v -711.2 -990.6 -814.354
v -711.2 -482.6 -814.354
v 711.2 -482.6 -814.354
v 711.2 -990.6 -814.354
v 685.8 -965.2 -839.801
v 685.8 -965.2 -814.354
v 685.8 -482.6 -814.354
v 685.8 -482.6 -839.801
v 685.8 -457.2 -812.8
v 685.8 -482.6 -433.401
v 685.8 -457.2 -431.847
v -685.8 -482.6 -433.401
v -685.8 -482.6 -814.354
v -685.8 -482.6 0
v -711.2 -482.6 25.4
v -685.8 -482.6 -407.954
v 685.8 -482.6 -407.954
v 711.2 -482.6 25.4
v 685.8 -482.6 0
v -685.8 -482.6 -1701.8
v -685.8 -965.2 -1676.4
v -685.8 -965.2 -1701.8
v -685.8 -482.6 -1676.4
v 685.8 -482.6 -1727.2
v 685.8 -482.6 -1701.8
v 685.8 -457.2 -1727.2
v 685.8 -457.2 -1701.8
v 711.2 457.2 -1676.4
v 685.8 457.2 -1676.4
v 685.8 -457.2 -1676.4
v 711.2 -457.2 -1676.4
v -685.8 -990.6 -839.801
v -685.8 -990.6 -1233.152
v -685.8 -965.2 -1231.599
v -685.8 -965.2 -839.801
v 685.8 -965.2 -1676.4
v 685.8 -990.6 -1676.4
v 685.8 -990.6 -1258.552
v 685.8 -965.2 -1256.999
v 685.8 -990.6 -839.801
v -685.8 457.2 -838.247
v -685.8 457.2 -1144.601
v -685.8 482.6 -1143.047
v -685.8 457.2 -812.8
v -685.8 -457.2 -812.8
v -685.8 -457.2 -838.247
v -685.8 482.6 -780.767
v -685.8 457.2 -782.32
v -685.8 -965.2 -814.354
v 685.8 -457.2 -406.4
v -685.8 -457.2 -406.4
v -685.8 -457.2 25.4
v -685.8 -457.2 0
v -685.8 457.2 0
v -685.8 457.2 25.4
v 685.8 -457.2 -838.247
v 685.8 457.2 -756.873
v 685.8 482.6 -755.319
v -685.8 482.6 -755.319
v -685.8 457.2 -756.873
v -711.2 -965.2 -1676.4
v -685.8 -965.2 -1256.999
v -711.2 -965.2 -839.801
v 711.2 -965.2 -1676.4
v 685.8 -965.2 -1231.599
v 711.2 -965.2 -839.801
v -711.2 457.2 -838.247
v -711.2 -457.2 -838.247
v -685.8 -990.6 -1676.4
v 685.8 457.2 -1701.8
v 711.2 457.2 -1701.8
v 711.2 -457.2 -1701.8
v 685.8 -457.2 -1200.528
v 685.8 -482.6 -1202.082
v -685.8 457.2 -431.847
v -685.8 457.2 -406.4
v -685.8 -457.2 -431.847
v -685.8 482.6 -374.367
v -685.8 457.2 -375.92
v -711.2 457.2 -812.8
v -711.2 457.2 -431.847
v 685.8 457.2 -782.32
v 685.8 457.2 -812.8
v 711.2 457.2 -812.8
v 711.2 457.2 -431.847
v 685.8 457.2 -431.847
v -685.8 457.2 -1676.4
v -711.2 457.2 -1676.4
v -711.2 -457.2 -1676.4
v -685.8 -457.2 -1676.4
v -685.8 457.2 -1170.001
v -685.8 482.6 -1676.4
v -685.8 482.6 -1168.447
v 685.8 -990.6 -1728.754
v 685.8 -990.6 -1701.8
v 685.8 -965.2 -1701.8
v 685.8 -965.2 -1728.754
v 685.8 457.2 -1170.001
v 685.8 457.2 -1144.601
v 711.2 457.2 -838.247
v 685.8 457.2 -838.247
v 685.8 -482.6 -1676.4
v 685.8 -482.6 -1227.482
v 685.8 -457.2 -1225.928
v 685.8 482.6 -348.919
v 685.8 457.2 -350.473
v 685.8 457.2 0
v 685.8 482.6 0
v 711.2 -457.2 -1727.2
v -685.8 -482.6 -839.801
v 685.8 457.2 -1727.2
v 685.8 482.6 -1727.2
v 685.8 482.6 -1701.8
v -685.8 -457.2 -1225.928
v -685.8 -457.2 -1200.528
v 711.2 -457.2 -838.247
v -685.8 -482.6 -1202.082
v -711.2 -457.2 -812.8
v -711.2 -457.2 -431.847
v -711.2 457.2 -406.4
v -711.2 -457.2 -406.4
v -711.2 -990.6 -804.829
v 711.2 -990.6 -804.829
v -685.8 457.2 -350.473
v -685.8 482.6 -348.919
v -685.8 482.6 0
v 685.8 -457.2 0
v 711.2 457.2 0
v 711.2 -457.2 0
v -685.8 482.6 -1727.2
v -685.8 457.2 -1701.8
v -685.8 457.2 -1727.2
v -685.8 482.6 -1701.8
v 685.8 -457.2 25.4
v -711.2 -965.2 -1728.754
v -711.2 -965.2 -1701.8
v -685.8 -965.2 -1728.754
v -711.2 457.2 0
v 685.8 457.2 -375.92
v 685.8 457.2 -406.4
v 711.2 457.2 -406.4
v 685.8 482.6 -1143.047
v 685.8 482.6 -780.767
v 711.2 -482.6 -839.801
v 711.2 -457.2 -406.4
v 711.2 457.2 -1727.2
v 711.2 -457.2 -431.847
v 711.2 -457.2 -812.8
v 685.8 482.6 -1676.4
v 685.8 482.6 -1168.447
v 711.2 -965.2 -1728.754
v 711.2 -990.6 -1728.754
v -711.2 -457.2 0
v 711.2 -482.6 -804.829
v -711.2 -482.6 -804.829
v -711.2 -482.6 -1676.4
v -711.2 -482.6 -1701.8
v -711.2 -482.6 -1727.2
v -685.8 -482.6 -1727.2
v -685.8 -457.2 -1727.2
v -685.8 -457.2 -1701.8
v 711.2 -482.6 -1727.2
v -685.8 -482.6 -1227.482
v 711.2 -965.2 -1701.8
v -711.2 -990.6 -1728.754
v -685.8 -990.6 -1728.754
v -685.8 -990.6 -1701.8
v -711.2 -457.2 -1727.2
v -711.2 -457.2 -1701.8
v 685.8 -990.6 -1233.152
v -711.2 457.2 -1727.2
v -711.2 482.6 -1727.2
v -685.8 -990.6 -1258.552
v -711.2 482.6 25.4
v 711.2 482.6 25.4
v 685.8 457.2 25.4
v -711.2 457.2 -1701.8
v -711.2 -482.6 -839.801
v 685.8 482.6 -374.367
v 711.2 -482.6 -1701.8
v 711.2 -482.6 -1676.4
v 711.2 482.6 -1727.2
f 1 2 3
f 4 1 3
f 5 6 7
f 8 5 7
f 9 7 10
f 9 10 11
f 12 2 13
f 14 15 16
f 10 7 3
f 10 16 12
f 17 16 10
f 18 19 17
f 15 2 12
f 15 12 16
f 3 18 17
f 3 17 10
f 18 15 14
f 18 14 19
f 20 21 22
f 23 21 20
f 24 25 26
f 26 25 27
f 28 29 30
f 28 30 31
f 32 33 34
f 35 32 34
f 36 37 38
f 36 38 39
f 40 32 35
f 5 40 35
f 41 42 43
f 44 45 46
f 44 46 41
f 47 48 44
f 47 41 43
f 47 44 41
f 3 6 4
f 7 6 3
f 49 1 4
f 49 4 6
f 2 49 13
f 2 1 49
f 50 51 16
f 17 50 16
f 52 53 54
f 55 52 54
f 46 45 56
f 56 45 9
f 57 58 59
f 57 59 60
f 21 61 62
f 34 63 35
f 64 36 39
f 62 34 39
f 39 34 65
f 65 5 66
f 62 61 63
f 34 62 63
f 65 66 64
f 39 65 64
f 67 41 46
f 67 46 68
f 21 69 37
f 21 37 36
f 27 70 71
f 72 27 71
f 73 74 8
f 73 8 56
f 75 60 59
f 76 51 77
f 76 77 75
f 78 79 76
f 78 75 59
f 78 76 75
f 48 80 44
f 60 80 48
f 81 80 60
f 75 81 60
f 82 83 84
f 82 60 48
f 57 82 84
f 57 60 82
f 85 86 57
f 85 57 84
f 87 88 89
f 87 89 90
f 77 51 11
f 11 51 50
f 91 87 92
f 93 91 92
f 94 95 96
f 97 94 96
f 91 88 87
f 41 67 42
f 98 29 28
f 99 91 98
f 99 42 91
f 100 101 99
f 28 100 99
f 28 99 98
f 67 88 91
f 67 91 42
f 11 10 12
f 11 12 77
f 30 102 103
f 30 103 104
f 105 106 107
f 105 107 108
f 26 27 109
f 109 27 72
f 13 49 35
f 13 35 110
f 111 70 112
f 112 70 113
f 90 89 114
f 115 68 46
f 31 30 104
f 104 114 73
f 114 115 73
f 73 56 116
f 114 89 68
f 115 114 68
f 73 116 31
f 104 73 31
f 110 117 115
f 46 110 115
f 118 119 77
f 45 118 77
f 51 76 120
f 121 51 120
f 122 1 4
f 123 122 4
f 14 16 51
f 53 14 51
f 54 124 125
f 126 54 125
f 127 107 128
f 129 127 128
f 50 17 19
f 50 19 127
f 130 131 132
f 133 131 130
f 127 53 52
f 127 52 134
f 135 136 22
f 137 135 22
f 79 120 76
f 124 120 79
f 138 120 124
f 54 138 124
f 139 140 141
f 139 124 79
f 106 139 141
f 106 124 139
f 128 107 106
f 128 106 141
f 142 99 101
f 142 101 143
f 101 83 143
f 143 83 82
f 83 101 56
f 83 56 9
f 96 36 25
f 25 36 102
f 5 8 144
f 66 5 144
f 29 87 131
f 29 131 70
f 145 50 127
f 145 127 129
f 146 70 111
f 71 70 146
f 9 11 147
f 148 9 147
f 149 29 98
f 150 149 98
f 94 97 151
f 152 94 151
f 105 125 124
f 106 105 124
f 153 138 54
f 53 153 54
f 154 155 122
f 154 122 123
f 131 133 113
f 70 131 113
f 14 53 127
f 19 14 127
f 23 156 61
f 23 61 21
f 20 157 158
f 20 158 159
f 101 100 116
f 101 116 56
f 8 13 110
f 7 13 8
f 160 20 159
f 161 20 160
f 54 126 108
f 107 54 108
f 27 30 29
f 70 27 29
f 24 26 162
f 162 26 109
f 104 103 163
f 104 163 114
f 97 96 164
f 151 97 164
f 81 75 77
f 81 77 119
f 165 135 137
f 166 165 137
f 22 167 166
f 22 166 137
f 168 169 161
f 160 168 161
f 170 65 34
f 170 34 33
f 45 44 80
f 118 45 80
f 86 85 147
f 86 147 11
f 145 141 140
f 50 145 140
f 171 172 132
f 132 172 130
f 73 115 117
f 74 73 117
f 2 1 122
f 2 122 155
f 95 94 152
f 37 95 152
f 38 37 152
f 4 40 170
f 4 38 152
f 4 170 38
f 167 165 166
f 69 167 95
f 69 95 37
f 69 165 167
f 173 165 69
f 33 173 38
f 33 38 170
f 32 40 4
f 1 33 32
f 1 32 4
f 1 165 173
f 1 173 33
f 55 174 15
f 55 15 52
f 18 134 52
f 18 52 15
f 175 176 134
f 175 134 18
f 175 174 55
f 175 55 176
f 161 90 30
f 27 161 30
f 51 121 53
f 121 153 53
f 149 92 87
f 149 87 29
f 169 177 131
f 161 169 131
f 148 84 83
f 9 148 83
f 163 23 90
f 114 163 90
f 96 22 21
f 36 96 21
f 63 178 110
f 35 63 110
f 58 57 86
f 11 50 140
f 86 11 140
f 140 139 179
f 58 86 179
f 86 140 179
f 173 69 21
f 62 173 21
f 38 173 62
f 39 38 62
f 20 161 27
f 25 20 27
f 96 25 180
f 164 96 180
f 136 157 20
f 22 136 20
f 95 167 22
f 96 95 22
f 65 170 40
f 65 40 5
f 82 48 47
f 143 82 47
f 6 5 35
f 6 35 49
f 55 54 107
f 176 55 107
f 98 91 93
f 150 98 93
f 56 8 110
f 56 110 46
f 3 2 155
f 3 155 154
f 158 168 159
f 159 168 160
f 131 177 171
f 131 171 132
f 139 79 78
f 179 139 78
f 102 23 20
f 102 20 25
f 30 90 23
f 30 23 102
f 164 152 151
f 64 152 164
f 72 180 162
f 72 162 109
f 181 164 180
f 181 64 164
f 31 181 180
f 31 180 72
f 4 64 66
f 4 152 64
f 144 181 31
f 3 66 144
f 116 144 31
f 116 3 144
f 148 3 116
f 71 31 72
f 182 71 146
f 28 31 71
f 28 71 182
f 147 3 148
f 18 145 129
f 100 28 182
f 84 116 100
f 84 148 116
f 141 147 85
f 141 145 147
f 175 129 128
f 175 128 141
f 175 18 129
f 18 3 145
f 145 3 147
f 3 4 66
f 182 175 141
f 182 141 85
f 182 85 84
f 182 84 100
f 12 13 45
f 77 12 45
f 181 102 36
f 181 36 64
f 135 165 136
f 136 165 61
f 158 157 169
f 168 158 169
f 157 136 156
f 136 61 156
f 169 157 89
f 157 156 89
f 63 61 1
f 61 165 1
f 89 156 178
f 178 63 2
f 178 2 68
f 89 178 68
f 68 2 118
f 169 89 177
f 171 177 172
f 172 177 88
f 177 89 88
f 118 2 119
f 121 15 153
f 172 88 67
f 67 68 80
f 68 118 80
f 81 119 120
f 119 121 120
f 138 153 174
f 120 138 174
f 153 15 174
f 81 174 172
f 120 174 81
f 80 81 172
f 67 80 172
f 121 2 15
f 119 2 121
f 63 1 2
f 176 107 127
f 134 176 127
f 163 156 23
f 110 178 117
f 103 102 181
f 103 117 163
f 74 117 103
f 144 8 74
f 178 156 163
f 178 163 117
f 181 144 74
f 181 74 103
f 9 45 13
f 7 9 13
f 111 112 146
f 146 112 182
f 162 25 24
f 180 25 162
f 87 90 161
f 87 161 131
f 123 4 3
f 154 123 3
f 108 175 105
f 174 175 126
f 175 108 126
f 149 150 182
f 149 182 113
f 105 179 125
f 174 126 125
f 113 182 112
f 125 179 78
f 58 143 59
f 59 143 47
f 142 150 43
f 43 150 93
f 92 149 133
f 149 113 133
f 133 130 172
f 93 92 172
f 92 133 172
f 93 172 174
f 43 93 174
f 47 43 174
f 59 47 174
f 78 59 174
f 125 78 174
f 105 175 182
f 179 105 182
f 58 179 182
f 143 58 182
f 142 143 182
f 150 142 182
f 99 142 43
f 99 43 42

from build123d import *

# Parameters (mm, degrees)
F0_W      = 25.4
F0_H      = 914.4
F0_H_2    = 25.4
F0_W_2    = 1371.6
F1_DEPTH  = 25.4
F2_DEPTH  = 1727.2
F4_DEPTH  = 1422.4
F6_W      = 1422.4
F6_H      = 965.2
F6_W_2    = 1371.6
F6_H_2    = 914.4
F7_DEPTH  = 25.4
F8_W      = 25.4
F8_H      = 25.4474646512
F9_DEPTH  = 914.4
F10_W     = 25.4
F10_H     = 25.4474646512
F10_H_2   = 25.4
F11_DEPTH = 508
F12_W     = 25.4
F12_H     = 25.4
F13_DEPTH = 914.4
F14_W     = 25.4
F14_H     = 25.4
F15_DEPTH = 914.4
F16_W     = 25.4
F16_H     = 25.4474646512
F16_H_2   = 25.4
F17_DEPTH = 1371.6
F18_W     = 1422.4
F18_H     = 508
F19_DEPTH = 9.525
F21_DEPTH = 1422.4


# Not quite as in the source:
# - a feature names something its author has since deleted; it is built from what else it names


with BuildPart() as f1:
    # F0 (on Top) → F1 (new body)
    with BuildSketch(Plane.XY):
        with Locations((698.5, 0)):
            Rectangle(F0_W, F0_H)
        with Locations((698.5, 469.9)):
            Rectangle(F0_W, F0_H_2)
        with Locations((0, 469.9)):
            Rectangle(F0_W_2, F0_H_2)
        with Locations((-698.5, 0)):
            Rectangle(F0_W, F0_H)
        with Locations((-698.5, 469.9)):
            Rectangle(F0_W, F0_H_2)
        with Locations((0, -469.9)):
            Rectangle(F0_W_2, F0_H_2)
        with Locations((698.5, -469.9)):
            Rectangle(F0_W, F0_H_2)
        with Locations((-698.5, -469.9)):
            Rectangle(F0_W, F0_H_2)
    extrude(amount=F1_DEPTH)

    # F0 (on Top) → F2 (join)
    with BuildSketch(Plane.XY):
        with Locations((-698.5, -469.9)):
            Rectangle(F0_W, F0_H_2)
        with Locations((-698.5, 469.9)):
            Rectangle(F0_W, F0_H_2)
        with Locations((698.5, 469.9)):
            Rectangle(F0_W, F0_H_2)
        with Locations((698.5, -469.9)):
            Rectangle(F0_W, F0_H_2)
    extrude(amount=-F2_DEPTH)

    # F3 (on face) → F4 (join)
    with BuildSketch(Plane.YZ.offset(711.2)):
        Polygon((-457.2, -431.8474646512), (-457.2, -406.4), (-482.6, -407.9535305518), (-482.6, -433.400995203), align=None)
        Polygon((482.6, -348.9193695826), (457.2, -350.4729001344), (457.2, -375.9203647856), (482.6, -374.3668342338), align=None)
        Polygon((482.6, -755.3193695826), (457.2, -756.8729001344), (457.2, -782.3203647856), (482.6, -780.7668342338), align=None)
        Polygon((-457.2, -838.2474646512), (-457.2, -812.8), (-482.6, -814.3535305518), (-482.6, -839.800995203), align=None)
    extrude(amount=-F4_DEPTH)

    # F6 (on offset) → F7 (join)
    with BuildSketch(Plane.XY.offset(-1676.4)):
        Rectangle(F6_W, F6_H)
        Rectangle(F6_W_2, F6_H_2, mode=Mode.SUBTRACT)
    extrude(amount=-F7_DEPTH)

    # F8 (on face) → F9 (join)
    with BuildSketch(Plane(origin=(0, -457.2, 0), x_dir=(-1, 0, 0), z_dir=(0, 1, 0))):
        with Locations((-698.5, -825.5237323256)):
            Rectangle(F8_W, F8_H)
        with Locations((698.5, -825.5237323256)):
            Rectangle(F8_W, F8_H)
        with Locations((-698.5, -419.1237323256)):
            Rectangle(F8_W, F8_H)
        with Locations((698.5, -419.1237323256)):
            Rectangle(F8_W, F8_H)
    extrude(amount=F9_DEPTH)

    # F10 (on face) → F11 (join)
    with BuildSketch(Plane.XZ.offset(482.6)):
        with Locations((-698.5, -827.0772628774)):
            Rectangle(F10_W, F10_H)
        with Locations((698.5, -827.0772628774)):
            Rectangle(F10_W, F10_H)
        with Locations((-698.5, -1689.1)):
            Rectangle(F10_W, F10_H_2)
        with Locations((698.5, -1689.1)):
            Rectangle(F10_W, F10_H_2)
    extrude(amount=F11_DEPTH)

    # F12 (on face) → F13 (join)
    with BuildSketch(Plane.XY.offset(-814.3535305518)):
        with Locations((-698.5, -977.9)):
            Rectangle(F12_W, F12_H)
    extrude(amount=-F13_DEPTH)

    # F14 (on face) → F15 (join)
    with BuildSketch(Plane.XY.offset(-814.3535305518)):
        with Locations((698.5, -977.9)):
            Rectangle(F14_W, F14_H)
    extrude(amount=-F15_DEPTH)

    # F16 (on face) → F17 (join)
    with BuildSketch(Plane.YZ.offset(-685.8)):
        with Locations((-977.9, -827.0772628774)):
            Rectangle(F16_W, F16_H)
        with Locations((-977.9, -1689.1)):
            Rectangle(F16_W, F16_H_2)
    extrude(amount=F17_DEPTH)

    # F20 (on face) → F21 (join)
    with BuildSketch(Plane.YZ.offset(711.2)):
        Polygon((482.6, -1168.4474646512), (482.6, -1143.0474646512), (457.2, -1144.600995203), (457.2, -1170.000995203), align=None)
        Polygon((-457.2, -1225.9280950687), (-457.2, -1200.5280950687), (-482.6, -1202.0816256205), (-482.6, -1227.4816256205), align=None)
        Polygon((-965.2, -1256.9987061051), (-965.2, -1231.5987061051), (-990.6, -1233.1522366569), (-990.6, -1258.5522366569), align=None)
    extrude(amount=-F21_DEPTH)


with BuildPart() as f19:
    # F18 (on face) → F19 (new body)
    with BuildSketch(Plane.XY.offset(-814.3535305518)):
        with Locations((0, -736.6)):
            Rectangle(F18_W, F18_H)
    extrude(amount=F19_DEPTH)


solid = Compound([f1.part, f19.part])
